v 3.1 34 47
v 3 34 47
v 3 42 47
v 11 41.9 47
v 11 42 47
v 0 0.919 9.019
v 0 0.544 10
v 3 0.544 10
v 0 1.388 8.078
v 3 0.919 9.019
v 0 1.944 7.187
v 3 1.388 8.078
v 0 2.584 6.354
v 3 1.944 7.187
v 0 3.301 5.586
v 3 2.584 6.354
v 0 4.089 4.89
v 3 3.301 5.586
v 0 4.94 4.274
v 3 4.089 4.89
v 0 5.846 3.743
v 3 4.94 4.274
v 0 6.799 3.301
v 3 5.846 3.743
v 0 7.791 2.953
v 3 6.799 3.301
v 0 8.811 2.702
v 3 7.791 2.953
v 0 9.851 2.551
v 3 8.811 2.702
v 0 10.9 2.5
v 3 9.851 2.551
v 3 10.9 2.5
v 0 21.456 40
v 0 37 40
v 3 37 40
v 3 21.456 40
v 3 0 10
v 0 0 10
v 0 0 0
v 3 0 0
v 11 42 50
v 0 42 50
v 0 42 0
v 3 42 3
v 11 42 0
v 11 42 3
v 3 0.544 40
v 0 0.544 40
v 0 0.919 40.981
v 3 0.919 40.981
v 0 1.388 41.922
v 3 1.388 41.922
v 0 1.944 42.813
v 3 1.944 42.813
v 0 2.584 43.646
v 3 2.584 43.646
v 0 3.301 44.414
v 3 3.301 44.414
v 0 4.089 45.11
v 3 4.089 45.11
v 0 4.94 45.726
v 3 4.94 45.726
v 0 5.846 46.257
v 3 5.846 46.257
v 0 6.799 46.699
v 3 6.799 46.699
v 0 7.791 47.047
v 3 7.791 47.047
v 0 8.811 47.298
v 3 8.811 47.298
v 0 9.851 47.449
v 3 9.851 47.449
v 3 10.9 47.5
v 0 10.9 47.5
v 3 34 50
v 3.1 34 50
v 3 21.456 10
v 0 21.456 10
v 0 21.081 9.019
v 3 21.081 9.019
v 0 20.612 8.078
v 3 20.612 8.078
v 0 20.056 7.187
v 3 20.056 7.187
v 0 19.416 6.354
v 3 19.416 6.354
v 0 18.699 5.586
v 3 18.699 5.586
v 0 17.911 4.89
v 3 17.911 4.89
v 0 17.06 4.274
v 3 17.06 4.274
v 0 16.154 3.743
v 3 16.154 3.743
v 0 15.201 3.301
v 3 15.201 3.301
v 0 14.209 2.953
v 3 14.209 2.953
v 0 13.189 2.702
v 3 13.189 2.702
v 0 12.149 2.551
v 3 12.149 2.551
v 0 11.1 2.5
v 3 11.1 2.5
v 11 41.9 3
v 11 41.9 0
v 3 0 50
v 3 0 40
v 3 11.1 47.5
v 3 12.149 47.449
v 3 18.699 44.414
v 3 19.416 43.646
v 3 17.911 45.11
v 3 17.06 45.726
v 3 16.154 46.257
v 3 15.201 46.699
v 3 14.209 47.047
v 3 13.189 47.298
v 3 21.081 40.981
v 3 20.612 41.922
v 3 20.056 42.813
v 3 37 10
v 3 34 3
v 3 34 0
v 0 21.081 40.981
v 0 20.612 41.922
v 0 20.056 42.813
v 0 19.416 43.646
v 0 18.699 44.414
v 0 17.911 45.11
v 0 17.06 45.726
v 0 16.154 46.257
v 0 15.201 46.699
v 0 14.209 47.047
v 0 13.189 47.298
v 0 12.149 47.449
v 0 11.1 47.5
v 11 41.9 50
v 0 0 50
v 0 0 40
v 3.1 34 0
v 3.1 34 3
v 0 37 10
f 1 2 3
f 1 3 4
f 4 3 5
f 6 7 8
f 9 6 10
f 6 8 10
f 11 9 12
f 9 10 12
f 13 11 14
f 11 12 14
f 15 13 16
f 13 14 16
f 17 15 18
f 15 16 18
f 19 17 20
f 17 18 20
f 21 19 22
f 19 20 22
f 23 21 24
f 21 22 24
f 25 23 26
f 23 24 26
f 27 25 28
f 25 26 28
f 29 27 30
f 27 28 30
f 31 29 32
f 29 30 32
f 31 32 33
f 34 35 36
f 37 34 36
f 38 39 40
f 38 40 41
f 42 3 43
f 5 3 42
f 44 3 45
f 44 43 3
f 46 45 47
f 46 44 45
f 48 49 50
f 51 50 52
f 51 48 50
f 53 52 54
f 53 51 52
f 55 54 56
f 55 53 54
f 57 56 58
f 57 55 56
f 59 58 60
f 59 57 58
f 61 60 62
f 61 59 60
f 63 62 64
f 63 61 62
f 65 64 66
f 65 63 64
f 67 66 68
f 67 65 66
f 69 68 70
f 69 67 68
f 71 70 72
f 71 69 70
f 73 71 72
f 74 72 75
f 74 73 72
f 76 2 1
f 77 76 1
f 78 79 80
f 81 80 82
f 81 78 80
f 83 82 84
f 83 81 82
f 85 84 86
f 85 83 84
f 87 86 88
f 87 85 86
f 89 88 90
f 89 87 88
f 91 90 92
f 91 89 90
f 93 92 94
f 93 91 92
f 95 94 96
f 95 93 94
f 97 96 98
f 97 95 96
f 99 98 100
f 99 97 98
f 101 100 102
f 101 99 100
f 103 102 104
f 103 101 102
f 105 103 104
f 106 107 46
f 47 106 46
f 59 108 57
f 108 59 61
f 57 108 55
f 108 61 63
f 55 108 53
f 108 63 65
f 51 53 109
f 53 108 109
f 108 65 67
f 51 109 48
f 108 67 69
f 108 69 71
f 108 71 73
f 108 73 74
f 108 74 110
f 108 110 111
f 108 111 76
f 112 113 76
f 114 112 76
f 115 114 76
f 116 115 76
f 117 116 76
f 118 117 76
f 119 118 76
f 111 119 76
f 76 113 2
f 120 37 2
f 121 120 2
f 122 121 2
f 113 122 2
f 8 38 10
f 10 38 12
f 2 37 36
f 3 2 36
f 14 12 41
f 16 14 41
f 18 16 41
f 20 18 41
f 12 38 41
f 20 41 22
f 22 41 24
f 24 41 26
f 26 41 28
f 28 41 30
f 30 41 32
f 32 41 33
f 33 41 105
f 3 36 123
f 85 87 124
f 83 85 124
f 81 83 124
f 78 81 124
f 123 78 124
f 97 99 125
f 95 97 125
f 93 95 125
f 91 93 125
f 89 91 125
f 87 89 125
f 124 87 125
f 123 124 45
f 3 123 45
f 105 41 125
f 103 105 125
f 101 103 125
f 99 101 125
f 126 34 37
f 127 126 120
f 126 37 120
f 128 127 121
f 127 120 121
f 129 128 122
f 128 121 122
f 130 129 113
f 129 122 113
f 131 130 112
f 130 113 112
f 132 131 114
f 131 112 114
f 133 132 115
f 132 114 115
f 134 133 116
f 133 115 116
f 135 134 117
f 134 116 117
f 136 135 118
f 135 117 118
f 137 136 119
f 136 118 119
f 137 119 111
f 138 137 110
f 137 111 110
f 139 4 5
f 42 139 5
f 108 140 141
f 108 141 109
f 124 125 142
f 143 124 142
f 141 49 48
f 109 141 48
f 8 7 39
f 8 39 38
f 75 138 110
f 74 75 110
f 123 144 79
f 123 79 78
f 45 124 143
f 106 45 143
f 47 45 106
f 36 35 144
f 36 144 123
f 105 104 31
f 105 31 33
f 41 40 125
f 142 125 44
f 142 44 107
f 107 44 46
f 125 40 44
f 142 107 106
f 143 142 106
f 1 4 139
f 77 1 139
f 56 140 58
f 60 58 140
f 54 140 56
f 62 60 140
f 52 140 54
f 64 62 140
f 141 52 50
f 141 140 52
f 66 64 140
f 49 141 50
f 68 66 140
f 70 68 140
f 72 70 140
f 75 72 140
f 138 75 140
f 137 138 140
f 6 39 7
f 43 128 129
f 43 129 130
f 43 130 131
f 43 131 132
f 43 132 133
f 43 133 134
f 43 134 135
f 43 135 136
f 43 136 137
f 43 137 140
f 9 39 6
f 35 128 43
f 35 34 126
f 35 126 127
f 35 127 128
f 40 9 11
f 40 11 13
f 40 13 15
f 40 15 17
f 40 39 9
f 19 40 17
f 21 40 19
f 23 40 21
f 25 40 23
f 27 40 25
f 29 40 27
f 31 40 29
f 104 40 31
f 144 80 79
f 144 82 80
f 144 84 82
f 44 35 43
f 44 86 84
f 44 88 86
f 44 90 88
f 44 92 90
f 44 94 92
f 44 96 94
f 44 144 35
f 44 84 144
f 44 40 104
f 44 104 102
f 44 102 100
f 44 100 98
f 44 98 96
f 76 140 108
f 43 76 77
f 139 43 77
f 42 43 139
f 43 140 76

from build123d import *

# Parameters (mm, degrees)
BOX272_W        = 97
BOX272_H        = 22
BOX272_DEPTH    = 45
FILLET031_R     = 10.9
BOX274_W        = 8
BOX274_H        = 8
BOX274_DEPTH    = 3
CHAMFER049_SIZE = 7.9
BOX266_W        = 3
BOX266_H        = 5
BOX266_DEPTH    = 50
BOX265_W        = 3
BOX265_H        = 42
BOX265_DEPTH    = 10
BOX264_W        = 3
BOX264_H        = 42
BOX264_DEPTH    = 10
BOX275_W        = 8
BOX275_H        = 8
BOX275_DEPTH    = 3
CHAMFER050_SIZE = 7.9


with BuildPart() as battery_pack001:
    # Box272 → Box272 (new body)
    with BuildSketch(Plane.XY):
        with Locations((48.5, 11)):
            Rectangle(BOX272_W, BOX272_H)
    extrude(amount=BOX272_DEPTH)

    # Fillet031
    fillet031_edges = [battery_pack001.edges().sort_by_distance(p)[0] for p in [
        (48.5, 0, 0),
        (48.5, 0, 45),
        (48.5, 22, 0),
        (48.5, 22, 45),
    ]]
    fillet(fillet031_edges, radius=FILLET031_R)


with BuildPart() as battery_pack001_1:
    # Fillet031 placement: moved
    add(battery_pack001.part.moved(Location((0, 0, 2.5))))


with BuildPart() as chamfer049:
    # Box274 → Box274 (new body)
    with BuildSketch(Plane(origin=(3, 32, 0), x_dir=(1, 0, 0), z_dir=(0, 0, 1))):
        with Locations((4, 4)):
            Rectangle(BOX274_W, BOX274_H)
    extrude(amount=BOX274_DEPTH)

    # Chamfer049
    chamfer049_edges = [chamfer049.edges().sort_by_distance(p)[0] for p in [
        (11, 32, 1.5),
    ]]
    chamfer(chamfer049_edges, length=CHAMFER049_SIZE)


with BuildPart() as chamfer049_1:
    # Chamfer049 placement: moved
    add(chamfer049.part.moved(Location((0, 2, 47))))


with BuildPart() as cube238:
    # Box266 → Box266 (new body)
    with BuildSketch(Plane(origin=(0, 37, 0), x_dir=(1, 0, 0), z_dir=(0, 0, 1))):
        with Locations((1.5, 2.5)):
            Rectangle(BOX266_W, BOX266_H)
    extrude(amount=BOX266_DEPTH)


with BuildPart() as cube237:
    # Box265 → Box265 (new body)
    with BuildSketch(Plane.XY.offset(40)):
        with Locations((1.5, 21)):
            Rectangle(BOX265_W, BOX265_H)
    extrude(amount=BOX265_DEPTH)


with BuildPart() as cube236:
    # Box264 → Box264 (new body)
    with BuildSketch(Plane.XY):
        with Locations((1.5, 21)):
            Rectangle(BOX264_W, BOX264_H)
    extrude(amount=BOX264_DEPTH)


with BuildPart() as cut:
    # Box275 → Box275 (new body)
    with BuildSketch(Plane(origin=(3, 32, 0), x_dir=(1, 0, 0), z_dir=(0, 0, 1))):
        with Locations((4, 4)):
            Rectangle(BOX275_W, BOX275_H)
    extrude(amount=BOX275_DEPTH)

    # Chamfer050
    chamfer050_edges = [cut.edges().sort_by_distance(p)[0] for p in [
        (11, 32, 1.5),
    ]]
    chamfer(chamfer050_edges, length=CHAMFER050_SIZE)


with BuildPart() as cut_1:
    # Chamfer050 placement: moved
    add(cut.part.moved(Location((0, 2, 0))))

    # Fusion073: union Chamfer049, Cube238, Cube237, Cube236
    add(chamfer049_1.part)
    add(cube238.part)
    add(cube237.part)
    add(cube236.part)

    # Cut: cut Battery pack001
    add(battery_pack001_1.part, mode=Mode.SUBTRACT)


solid = cut_1.part
